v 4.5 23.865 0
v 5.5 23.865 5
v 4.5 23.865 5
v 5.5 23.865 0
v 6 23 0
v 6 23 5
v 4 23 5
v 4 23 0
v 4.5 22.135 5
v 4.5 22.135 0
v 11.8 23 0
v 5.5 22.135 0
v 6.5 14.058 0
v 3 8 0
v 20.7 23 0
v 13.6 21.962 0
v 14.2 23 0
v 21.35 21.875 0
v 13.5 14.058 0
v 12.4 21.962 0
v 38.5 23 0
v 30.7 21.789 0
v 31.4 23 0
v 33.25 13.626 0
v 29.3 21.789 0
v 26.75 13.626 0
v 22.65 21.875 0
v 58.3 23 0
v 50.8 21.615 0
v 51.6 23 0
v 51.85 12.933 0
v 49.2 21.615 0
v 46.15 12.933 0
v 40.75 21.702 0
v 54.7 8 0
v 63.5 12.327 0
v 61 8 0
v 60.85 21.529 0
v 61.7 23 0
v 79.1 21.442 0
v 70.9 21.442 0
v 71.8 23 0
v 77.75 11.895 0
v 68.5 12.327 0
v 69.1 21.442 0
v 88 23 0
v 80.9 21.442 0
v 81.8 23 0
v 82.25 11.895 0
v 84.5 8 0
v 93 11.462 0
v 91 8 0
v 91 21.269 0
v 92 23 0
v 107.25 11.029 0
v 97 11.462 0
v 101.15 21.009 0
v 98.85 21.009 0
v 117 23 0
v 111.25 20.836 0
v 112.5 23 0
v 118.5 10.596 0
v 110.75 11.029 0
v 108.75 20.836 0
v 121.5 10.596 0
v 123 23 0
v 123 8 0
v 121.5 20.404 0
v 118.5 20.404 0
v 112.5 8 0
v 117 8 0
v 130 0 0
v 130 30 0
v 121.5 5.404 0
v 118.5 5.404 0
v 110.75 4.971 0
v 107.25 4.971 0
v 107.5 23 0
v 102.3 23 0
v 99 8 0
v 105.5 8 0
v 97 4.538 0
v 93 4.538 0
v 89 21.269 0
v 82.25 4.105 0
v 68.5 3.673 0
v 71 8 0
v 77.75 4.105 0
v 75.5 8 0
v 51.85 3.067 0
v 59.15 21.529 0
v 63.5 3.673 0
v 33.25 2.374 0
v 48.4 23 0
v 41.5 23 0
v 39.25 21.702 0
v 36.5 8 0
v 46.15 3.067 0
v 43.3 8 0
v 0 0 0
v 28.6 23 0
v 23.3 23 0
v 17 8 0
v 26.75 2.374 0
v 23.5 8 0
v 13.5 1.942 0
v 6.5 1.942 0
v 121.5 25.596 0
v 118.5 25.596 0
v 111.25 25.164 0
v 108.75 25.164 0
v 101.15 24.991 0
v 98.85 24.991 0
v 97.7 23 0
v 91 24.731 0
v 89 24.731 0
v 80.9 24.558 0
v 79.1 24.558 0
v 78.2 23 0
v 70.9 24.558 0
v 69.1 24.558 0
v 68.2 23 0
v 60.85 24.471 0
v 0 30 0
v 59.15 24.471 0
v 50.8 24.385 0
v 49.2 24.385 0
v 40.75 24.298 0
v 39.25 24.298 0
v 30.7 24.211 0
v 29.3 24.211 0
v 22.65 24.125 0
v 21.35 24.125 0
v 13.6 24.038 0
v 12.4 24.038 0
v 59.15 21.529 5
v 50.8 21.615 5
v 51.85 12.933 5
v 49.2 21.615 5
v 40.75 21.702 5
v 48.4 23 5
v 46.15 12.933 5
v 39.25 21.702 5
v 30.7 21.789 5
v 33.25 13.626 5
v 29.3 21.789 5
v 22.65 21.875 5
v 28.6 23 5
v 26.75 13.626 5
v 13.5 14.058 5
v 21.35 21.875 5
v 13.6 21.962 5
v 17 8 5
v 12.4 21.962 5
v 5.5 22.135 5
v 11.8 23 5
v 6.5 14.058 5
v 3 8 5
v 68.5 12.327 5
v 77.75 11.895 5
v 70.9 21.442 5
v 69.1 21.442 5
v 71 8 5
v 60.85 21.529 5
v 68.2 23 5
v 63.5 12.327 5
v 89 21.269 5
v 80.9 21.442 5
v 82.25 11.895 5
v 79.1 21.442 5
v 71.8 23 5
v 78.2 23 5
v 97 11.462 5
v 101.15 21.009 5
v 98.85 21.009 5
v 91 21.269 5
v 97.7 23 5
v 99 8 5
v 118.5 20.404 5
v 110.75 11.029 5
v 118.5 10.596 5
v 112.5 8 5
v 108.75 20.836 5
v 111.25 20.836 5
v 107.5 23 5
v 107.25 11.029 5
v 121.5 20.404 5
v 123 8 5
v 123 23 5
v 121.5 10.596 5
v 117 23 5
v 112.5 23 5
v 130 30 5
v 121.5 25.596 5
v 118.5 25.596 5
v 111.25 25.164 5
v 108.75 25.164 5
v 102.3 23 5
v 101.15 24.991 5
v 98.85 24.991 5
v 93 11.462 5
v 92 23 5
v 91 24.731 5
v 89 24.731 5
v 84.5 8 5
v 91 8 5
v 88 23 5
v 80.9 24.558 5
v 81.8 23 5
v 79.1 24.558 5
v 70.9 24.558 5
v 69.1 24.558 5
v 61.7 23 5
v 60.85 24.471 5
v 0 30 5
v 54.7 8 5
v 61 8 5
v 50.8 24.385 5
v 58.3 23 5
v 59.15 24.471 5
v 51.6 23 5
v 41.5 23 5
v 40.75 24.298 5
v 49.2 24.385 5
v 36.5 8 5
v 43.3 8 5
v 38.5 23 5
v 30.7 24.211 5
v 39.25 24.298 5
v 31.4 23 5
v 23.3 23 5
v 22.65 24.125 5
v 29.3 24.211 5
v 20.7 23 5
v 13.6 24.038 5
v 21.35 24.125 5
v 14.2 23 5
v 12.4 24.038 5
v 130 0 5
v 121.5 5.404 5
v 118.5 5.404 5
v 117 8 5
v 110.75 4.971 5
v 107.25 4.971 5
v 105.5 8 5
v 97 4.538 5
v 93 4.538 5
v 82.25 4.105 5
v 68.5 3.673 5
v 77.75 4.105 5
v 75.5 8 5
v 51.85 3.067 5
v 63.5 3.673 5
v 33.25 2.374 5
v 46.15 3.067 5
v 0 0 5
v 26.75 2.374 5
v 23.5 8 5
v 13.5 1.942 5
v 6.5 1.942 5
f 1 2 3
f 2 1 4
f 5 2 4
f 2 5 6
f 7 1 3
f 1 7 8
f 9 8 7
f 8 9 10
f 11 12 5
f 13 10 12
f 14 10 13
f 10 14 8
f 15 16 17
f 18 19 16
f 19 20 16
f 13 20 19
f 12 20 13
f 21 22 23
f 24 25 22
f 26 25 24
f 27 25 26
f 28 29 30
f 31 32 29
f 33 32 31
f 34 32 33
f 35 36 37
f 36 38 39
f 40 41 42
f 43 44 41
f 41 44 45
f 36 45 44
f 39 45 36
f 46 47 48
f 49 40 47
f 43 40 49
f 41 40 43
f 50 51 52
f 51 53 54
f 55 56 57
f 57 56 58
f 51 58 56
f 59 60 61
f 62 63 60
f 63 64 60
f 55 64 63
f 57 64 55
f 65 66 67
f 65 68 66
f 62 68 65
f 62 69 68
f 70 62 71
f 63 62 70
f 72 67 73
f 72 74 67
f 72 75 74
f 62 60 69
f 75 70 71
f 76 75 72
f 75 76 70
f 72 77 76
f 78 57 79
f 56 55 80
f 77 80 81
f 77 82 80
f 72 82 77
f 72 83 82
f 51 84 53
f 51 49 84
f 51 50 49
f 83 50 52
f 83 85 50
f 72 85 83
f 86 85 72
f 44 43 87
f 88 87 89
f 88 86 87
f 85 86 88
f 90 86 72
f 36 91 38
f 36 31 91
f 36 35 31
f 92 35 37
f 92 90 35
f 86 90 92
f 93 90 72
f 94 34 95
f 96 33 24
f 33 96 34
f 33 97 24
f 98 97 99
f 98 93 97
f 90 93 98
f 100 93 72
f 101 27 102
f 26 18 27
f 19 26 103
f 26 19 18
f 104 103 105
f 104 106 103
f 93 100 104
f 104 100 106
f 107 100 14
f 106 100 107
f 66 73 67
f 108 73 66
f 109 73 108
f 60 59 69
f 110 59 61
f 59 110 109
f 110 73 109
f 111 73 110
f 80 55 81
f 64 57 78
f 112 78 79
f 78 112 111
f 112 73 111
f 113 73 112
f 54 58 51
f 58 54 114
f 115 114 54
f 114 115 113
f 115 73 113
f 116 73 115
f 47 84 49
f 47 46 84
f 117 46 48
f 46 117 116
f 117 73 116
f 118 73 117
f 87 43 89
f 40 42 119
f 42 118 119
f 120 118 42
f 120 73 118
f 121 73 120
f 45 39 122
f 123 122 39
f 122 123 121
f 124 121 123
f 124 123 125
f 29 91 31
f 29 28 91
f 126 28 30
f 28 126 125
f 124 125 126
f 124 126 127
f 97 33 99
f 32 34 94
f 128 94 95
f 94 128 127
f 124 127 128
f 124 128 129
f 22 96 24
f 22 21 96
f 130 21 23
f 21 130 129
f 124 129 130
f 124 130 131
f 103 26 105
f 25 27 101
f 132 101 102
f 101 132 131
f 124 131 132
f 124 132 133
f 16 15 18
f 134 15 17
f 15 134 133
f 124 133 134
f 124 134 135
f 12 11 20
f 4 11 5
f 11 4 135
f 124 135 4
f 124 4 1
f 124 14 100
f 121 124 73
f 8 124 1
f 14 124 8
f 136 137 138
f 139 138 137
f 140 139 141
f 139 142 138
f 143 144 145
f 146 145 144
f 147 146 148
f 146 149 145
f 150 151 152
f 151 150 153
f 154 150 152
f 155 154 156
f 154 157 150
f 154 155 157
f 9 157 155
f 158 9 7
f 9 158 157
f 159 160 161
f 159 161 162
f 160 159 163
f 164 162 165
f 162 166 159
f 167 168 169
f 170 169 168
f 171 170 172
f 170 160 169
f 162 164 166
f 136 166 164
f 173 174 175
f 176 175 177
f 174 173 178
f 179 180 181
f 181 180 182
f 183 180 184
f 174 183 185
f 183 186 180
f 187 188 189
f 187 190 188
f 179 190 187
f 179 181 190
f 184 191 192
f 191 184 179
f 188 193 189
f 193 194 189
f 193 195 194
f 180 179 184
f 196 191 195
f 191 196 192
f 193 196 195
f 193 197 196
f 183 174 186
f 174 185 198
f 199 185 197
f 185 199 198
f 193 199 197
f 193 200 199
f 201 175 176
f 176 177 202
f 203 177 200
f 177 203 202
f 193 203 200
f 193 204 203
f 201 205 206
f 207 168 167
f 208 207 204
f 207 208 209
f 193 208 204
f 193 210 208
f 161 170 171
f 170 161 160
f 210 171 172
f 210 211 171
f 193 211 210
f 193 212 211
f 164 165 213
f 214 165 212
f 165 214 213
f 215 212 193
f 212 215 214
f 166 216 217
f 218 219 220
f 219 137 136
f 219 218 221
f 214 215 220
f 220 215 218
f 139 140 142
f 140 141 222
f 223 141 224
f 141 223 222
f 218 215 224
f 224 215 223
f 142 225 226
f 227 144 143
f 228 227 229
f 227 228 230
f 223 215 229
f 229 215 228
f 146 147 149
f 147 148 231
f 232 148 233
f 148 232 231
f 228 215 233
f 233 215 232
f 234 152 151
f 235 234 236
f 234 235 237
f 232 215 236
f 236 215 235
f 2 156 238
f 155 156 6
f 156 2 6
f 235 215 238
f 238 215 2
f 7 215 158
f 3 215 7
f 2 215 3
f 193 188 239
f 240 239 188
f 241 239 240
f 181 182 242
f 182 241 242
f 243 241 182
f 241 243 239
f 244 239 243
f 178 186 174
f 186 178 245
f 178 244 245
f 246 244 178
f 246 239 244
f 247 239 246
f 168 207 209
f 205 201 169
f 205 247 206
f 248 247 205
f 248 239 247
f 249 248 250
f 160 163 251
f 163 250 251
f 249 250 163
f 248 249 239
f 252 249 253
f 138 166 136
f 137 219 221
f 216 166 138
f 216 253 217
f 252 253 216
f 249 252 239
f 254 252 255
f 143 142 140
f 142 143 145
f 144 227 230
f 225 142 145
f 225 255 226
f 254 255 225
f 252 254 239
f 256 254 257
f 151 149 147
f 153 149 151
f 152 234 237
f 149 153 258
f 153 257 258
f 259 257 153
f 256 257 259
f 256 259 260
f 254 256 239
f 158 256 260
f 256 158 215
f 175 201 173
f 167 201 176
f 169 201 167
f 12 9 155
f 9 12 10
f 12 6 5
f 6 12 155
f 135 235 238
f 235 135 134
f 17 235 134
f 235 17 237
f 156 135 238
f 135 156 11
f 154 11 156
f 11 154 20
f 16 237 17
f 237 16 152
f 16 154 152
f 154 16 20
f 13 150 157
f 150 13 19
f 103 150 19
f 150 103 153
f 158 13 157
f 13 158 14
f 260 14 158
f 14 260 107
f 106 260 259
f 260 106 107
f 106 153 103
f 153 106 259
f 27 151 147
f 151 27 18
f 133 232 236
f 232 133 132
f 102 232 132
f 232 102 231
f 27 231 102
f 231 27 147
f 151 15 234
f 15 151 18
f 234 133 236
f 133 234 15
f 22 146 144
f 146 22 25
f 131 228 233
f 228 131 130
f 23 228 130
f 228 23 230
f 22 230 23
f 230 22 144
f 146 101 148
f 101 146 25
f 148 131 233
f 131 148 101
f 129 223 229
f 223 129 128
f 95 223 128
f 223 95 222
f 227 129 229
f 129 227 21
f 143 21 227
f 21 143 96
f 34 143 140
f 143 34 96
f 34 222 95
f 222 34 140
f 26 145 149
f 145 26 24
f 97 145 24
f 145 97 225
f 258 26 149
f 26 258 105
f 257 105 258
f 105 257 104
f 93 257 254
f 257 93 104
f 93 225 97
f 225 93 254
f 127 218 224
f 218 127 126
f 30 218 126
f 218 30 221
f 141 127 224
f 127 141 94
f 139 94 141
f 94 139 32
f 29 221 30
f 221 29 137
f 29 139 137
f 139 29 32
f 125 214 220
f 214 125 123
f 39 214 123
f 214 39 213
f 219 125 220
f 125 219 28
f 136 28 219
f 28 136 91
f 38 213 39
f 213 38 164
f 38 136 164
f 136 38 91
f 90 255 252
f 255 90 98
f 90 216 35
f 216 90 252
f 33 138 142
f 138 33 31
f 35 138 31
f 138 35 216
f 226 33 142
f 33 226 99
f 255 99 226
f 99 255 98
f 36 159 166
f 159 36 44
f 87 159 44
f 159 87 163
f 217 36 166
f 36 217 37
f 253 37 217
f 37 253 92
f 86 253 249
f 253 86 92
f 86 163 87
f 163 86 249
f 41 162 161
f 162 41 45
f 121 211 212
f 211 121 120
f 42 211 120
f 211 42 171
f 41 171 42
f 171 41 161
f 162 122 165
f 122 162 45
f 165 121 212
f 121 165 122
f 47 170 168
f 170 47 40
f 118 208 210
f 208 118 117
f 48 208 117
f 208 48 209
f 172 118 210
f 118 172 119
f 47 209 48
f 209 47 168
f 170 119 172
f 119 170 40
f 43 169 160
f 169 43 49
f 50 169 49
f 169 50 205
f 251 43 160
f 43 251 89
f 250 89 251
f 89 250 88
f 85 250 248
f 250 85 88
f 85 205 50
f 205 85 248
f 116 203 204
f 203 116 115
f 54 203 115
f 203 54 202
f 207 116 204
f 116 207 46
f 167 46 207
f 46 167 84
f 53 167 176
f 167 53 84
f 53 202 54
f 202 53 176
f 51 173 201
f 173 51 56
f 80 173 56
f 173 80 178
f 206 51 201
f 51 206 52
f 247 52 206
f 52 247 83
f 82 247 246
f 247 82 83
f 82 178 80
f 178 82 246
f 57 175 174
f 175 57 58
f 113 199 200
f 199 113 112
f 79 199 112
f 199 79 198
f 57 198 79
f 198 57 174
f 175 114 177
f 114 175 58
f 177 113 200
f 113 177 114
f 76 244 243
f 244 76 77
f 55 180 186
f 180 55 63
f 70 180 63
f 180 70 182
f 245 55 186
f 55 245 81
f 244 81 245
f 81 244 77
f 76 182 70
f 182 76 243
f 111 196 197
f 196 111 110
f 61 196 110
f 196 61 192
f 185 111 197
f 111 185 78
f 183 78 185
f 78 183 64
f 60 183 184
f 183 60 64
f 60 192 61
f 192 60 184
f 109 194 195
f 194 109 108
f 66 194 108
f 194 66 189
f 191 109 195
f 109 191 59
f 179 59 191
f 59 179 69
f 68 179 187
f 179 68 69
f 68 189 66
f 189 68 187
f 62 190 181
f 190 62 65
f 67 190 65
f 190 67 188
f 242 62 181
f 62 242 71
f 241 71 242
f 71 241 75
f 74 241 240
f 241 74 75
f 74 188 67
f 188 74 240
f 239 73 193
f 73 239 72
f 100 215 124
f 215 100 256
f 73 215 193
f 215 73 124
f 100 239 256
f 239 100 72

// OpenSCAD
difference() {
  translate([65.0000000000, 15.0000000000, 2.5000000000]) {
    scale([130.0000000000, 30.0000000000, 5.0000000000]) {
      translate([-0.5000000000, -0.5000000000, -0.5000000000]) {
        cube([1, 1, 1]);
      }
    }
  }
  union() {
    union() {
      union() {
        union() {
          union() {
            union() {
              union() {
                union() {
                  union() {
                    union() {
                      union() {
                        union() {
                          union() {
                            union() {
                              union() {
                                union() {
                                  union() {
                                    union() {
                                      union() {
                                        union() {
                                          difference() {
                                            translate([5.0000000000, 23.0000000000, 2.5000000000]) {
                                              scale([2.0000000000, 1.7320000000, 5.0000000000]) {
                                                rotate([0.0000000000, 0.0000000000, -0.0000000000]) {
                                                  scale([0.5, 0.577, 1]) cylinder($fn = 6, center = true);
                                                }
                                              }
                                            }
                                            /* EMPTY */ sphere(r = 0);
                                          }
                                          difference() {
                                            translate([13.0000000000, 23.0000000000, 2.5000000000]) {
                                              scale([2.4000000000, 2.0780000000, 5.0000000000]) {
                                                rotate([0.0000000000, 0.0000000000, -0.0000000000]) {
                                                  scale([0.5, 0.577, 1]) cylinder($fn = 6, center = true);
                                                }
                                              }
                                            }
                                            /* EMPTY */ sphere(r = 0);
                                          }
                                        }
                                        difference() {
                                          translate([10.0000000000, 8.0000000000, 2.5000000000]) {
                                            scale([14.0000000000, 12.1240000000, 5.0000000000]) {
                                              rotate([0.0000000000, 0.0000000000, -0.0000000000]) {
                                                scale([0.5, 0.577, 1]) cylinder($fn = 6, center = true);
                                              }
                                            }
                                          }
                                          /* EMPTY */ sphere(r = 0);
                                        }
                                      }
                                      difference() {
                                        translate([22.0000000000, 23.0000000000, 2.5000000000]) {
                                          scale([2.6000000000, 2.2520000000, 5.0000000000]) {
                                            rotate([0.0000000000, 0.0000000000, -0.0000000000]) {
                                              scale([0.5, 0.577, 1]) cylinder($fn = 6, center = true);
                                            }
                                          }
                                        }
                                        /* EMPTY */ sphere(r = 0);
                                      }
                                    }
                                    difference() {
                                      translate([30.0000000000, 23.0000000000, 2.5000000000]) {
                                        scale([2.8000000000, 2.4240000000, 5.0000000000]) {
                                          rotate([0.0000000000, 0.0000000000, -0.0000000000]) {
                                            scale([0.5, 0.577, 1]) cylinder($fn = 6, center = true);
                                          }
                                        }
                                      }
                                      /* EMPTY */ sphere(r = 0);
                                    }
                                  }
                                  difference() {
                                    translate([40.0000000000, 23.0000000000, 2.5000000000]) {
                                      scale([3.0000000000, 2.5980000000, 5.0000000000]) {
                                        rotate([0.0000000000, 0.0000000000, -0.0000000000]) {
                                          scale([0.5, 0.577, 1]) cylinder($fn = 6, center = true);
                                        }
                                      }
                                    }
                                    /* EMPTY */ sphere(r = 0);
                                  }
                                }
                                difference() {
                                  translate([30.0000000000, 8.0000000000, 2.5000000000]) {
                                    scale([13.0000000000, 11.2580000000, 5.0000000000]) {
                                      rotate([0.0000000000, 0.0000000000, -0.0000000000]) {
                                        scale([0.5, 0.577, 1]) cylinder($fn = 6, center = true);
                                      }
                                    }
                                  }
                                  /* EMPTY */ sphere(r = 0);
                                }
                              }
                              difference() {
                                translate([50.0000000000, 23.0000000000, 2.5000000000]) {
                                  scale([3.2000000000, 2.7720000000, 5.0000000000]) {
                                    rotate([0.0000000000, 0.0000000000, -0.0000000000]) {
                                      scale([0.5, 0.577, 1]) cylinder($fn = 6, center = true);
                                    }
                                  }
                                }
                                /* EMPTY */ sphere(r = 0);
                              }
                            }
                            difference() {
                              translate([60.0000000000, 23.0000000000, 2.5000000000]) {
                                scale([3.4000000000, 2.9440000000, 5.0000000000]) {
                                  rotate([0.0000000000, 0.0000000000, -0.0000000000]) {
                                    scale([0.5, 0.577, 1]) cylinder($fn = 6, center = true);
                                  }
                                }
                              }
                              /* EMPTY */ sphere(r = 0);
                            }
                          }
                          difference() {
                            translate([49.0000500000, 7.9999874480, 2.5000000000]) {
                              scale([11.4000000000, 9.8720000000, 5.0000000000]) {
                                rotate([0.0000000000, 0.0000000000, -0.0000000000]) {
                                  scale([0.5, 0.577, 1]) cylinder($fn = 6, center = true);
                                }
                              }
                            }
                            /* EMPTY */ sphere(r = 0);
                          }
                        }
                        difference() {
                          translate([66.0000000000, 8.0000000000, 2.5000000000]) {
                            scale([10.0000000000, 8.6600000000, 5.0000000000]) {
                              rotate([0.0000000000, 0.0000000000, -0.0000000000]) {
                                scale([0.5, 0.577, 1]) cylinder($fn = 6, center = true);
                              }
                            }
                          }
                          /* EMPTY */ sphere(r = 0);
                        }
                      }
                      difference() {
                        translate([70.0000000000, 23.0000000000, 2.5000000000]) {
                          scale([3.6000000000, 3.1180000000, 5.0000000000]) {
                            rotate([0.0000000000, 0.0000000000, -0.0000000000]) {
                              scale([0.5, 0.577, 1]) cylinder($fn = 6, center = true);
                            }
                          }
                        }
                        /* EMPTY */ sphere(r = 0);
                      }
                    }
                    difference() {
                      translate([80.0000000000, 23.0000000000, 2.5000000000]) {
                        scale([3.6000000000, 3.1180000000, 5.0000000000]) {
                          rotate([0.0000000000, 0.0000000000, -0.0000000000]) {
                            scale([0.5, 0.577, 1]) cylinder($fn = 6, center = true);
                          }
                        }
                      }
                      /* EMPTY */ sphere(r = 0);
                    }
                  }
                  difference() {
                    translate([80.0000100000, 7.9999993170, 2.5000000000]) {
                      scale([9.0000000000, 7.7940000000, 5.0000000000]) {
                        rotate([0.0000000000, 0.0000000000, -0.0000000000]) {
                          scale([0.5, 0.577, 1]) cylinder($fn = 6, center = true);
                        }
                      }
                    }
                    /* EMPTY */ sphere(r = 0);
                  }
                }
                difference() {
                  translate([90.0000000000, 23.0000000000, 2.5000000000]) {
                    scale([4.0000000000, 3.4640000000, 5.0000000000]) {
                      rotate([0.0000000000, 0.0000000000, -0.0000000000]) {
                        scale([0.5, 0.577, 1]) cylinder($fn = 6, center = true);
                      }
                    }
                  }
                  /* EMPTY */ sphere(r = 0);
                }
              }
              difference() {
                translate([95.0000000000, 8.0000000000, 2.5000000000]) {
                  scale([8.0000000000, 6.9280000000, 5.0000000000]) {
                    rotate([0.0000000000, 0.0000000000, -0.0000000000]) {
                      scale([0.5, 0.577, 1]) cylinder($fn = 6, center = true);
                    }
                  }
                }
                /* EMPTY */ sphere(r = 0);
              }
            }
            difference() {
              translate([100.0000000000, 23.0000000000, 2.5000000000]) {
                scale([4.6000000000, 3.9840000000, 5.0000000000]) {
                  rotate([0.0000000000, 0.0000000000, -0.0000000000]) {
                    scale([0.5, 0.577, 1]) cylinder($fn = 6, center = true);
                  }
                }
              }
              /* EMPTY */ sphere(r = 0);
            }
          }
          difference() {
            translate([109.0000000000, 8.0000000000, 2.5000000000]) {
              scale([7.0000000000, 6.0620000000, 5.0000000000]) {
                rotate([0.0000000000, 0.0000000000, -0.0000000000]) {
                  scale([0.5, 0.577, 1]) cylinder($fn = 6, center = true);
                }
              }
            }
            /* EMPTY */ sphere(r = 0);
          }
        }
        difference() {
          translate([110.0000000000, 23.0000000000, 2.5000000000]) {
            scale([5.0000000000, 4.3300000000, 5.0000000000]) {
              rotate([0.0000000000, 0.0000000000, -0.0000000000]) {
                scale([0.5, 0.577, 1]) cylinder($fn = 6, center = true);
              }
            }
          }
          /* EMPTY */ sphere(r = 0);
        }
      }
      difference() {
        translate([120.0000000000, 23.0000000000, 2.5000000000]) {
          scale([6.0000000000, 5.1960000000, 5.0000000000]) {
            rotate([0.0000000000, 0.0000000000, -0.0000000000]) {
              scale([0.5, 0.577, 1]) cylinder($fn = 6, center = true);
            }
          }
        }
        /* EMPTY */ sphere(r = 0);
      }
    }
    difference() {
      translate([120.0000000000, 8.0000000000, 2.5000000000]) {
        scale([6.0000000000, 5.1960000000, 5.0000000000]) {
          rotate([0.0000000000, 0.0000000000, -0.0000000000]) {
            scale([0.5, 0.577, 1]) cylinder($fn = 6, center = true);
          }
        }
      }
      /* EMPTY */ sphere(r = 0);
    }
  }
}
